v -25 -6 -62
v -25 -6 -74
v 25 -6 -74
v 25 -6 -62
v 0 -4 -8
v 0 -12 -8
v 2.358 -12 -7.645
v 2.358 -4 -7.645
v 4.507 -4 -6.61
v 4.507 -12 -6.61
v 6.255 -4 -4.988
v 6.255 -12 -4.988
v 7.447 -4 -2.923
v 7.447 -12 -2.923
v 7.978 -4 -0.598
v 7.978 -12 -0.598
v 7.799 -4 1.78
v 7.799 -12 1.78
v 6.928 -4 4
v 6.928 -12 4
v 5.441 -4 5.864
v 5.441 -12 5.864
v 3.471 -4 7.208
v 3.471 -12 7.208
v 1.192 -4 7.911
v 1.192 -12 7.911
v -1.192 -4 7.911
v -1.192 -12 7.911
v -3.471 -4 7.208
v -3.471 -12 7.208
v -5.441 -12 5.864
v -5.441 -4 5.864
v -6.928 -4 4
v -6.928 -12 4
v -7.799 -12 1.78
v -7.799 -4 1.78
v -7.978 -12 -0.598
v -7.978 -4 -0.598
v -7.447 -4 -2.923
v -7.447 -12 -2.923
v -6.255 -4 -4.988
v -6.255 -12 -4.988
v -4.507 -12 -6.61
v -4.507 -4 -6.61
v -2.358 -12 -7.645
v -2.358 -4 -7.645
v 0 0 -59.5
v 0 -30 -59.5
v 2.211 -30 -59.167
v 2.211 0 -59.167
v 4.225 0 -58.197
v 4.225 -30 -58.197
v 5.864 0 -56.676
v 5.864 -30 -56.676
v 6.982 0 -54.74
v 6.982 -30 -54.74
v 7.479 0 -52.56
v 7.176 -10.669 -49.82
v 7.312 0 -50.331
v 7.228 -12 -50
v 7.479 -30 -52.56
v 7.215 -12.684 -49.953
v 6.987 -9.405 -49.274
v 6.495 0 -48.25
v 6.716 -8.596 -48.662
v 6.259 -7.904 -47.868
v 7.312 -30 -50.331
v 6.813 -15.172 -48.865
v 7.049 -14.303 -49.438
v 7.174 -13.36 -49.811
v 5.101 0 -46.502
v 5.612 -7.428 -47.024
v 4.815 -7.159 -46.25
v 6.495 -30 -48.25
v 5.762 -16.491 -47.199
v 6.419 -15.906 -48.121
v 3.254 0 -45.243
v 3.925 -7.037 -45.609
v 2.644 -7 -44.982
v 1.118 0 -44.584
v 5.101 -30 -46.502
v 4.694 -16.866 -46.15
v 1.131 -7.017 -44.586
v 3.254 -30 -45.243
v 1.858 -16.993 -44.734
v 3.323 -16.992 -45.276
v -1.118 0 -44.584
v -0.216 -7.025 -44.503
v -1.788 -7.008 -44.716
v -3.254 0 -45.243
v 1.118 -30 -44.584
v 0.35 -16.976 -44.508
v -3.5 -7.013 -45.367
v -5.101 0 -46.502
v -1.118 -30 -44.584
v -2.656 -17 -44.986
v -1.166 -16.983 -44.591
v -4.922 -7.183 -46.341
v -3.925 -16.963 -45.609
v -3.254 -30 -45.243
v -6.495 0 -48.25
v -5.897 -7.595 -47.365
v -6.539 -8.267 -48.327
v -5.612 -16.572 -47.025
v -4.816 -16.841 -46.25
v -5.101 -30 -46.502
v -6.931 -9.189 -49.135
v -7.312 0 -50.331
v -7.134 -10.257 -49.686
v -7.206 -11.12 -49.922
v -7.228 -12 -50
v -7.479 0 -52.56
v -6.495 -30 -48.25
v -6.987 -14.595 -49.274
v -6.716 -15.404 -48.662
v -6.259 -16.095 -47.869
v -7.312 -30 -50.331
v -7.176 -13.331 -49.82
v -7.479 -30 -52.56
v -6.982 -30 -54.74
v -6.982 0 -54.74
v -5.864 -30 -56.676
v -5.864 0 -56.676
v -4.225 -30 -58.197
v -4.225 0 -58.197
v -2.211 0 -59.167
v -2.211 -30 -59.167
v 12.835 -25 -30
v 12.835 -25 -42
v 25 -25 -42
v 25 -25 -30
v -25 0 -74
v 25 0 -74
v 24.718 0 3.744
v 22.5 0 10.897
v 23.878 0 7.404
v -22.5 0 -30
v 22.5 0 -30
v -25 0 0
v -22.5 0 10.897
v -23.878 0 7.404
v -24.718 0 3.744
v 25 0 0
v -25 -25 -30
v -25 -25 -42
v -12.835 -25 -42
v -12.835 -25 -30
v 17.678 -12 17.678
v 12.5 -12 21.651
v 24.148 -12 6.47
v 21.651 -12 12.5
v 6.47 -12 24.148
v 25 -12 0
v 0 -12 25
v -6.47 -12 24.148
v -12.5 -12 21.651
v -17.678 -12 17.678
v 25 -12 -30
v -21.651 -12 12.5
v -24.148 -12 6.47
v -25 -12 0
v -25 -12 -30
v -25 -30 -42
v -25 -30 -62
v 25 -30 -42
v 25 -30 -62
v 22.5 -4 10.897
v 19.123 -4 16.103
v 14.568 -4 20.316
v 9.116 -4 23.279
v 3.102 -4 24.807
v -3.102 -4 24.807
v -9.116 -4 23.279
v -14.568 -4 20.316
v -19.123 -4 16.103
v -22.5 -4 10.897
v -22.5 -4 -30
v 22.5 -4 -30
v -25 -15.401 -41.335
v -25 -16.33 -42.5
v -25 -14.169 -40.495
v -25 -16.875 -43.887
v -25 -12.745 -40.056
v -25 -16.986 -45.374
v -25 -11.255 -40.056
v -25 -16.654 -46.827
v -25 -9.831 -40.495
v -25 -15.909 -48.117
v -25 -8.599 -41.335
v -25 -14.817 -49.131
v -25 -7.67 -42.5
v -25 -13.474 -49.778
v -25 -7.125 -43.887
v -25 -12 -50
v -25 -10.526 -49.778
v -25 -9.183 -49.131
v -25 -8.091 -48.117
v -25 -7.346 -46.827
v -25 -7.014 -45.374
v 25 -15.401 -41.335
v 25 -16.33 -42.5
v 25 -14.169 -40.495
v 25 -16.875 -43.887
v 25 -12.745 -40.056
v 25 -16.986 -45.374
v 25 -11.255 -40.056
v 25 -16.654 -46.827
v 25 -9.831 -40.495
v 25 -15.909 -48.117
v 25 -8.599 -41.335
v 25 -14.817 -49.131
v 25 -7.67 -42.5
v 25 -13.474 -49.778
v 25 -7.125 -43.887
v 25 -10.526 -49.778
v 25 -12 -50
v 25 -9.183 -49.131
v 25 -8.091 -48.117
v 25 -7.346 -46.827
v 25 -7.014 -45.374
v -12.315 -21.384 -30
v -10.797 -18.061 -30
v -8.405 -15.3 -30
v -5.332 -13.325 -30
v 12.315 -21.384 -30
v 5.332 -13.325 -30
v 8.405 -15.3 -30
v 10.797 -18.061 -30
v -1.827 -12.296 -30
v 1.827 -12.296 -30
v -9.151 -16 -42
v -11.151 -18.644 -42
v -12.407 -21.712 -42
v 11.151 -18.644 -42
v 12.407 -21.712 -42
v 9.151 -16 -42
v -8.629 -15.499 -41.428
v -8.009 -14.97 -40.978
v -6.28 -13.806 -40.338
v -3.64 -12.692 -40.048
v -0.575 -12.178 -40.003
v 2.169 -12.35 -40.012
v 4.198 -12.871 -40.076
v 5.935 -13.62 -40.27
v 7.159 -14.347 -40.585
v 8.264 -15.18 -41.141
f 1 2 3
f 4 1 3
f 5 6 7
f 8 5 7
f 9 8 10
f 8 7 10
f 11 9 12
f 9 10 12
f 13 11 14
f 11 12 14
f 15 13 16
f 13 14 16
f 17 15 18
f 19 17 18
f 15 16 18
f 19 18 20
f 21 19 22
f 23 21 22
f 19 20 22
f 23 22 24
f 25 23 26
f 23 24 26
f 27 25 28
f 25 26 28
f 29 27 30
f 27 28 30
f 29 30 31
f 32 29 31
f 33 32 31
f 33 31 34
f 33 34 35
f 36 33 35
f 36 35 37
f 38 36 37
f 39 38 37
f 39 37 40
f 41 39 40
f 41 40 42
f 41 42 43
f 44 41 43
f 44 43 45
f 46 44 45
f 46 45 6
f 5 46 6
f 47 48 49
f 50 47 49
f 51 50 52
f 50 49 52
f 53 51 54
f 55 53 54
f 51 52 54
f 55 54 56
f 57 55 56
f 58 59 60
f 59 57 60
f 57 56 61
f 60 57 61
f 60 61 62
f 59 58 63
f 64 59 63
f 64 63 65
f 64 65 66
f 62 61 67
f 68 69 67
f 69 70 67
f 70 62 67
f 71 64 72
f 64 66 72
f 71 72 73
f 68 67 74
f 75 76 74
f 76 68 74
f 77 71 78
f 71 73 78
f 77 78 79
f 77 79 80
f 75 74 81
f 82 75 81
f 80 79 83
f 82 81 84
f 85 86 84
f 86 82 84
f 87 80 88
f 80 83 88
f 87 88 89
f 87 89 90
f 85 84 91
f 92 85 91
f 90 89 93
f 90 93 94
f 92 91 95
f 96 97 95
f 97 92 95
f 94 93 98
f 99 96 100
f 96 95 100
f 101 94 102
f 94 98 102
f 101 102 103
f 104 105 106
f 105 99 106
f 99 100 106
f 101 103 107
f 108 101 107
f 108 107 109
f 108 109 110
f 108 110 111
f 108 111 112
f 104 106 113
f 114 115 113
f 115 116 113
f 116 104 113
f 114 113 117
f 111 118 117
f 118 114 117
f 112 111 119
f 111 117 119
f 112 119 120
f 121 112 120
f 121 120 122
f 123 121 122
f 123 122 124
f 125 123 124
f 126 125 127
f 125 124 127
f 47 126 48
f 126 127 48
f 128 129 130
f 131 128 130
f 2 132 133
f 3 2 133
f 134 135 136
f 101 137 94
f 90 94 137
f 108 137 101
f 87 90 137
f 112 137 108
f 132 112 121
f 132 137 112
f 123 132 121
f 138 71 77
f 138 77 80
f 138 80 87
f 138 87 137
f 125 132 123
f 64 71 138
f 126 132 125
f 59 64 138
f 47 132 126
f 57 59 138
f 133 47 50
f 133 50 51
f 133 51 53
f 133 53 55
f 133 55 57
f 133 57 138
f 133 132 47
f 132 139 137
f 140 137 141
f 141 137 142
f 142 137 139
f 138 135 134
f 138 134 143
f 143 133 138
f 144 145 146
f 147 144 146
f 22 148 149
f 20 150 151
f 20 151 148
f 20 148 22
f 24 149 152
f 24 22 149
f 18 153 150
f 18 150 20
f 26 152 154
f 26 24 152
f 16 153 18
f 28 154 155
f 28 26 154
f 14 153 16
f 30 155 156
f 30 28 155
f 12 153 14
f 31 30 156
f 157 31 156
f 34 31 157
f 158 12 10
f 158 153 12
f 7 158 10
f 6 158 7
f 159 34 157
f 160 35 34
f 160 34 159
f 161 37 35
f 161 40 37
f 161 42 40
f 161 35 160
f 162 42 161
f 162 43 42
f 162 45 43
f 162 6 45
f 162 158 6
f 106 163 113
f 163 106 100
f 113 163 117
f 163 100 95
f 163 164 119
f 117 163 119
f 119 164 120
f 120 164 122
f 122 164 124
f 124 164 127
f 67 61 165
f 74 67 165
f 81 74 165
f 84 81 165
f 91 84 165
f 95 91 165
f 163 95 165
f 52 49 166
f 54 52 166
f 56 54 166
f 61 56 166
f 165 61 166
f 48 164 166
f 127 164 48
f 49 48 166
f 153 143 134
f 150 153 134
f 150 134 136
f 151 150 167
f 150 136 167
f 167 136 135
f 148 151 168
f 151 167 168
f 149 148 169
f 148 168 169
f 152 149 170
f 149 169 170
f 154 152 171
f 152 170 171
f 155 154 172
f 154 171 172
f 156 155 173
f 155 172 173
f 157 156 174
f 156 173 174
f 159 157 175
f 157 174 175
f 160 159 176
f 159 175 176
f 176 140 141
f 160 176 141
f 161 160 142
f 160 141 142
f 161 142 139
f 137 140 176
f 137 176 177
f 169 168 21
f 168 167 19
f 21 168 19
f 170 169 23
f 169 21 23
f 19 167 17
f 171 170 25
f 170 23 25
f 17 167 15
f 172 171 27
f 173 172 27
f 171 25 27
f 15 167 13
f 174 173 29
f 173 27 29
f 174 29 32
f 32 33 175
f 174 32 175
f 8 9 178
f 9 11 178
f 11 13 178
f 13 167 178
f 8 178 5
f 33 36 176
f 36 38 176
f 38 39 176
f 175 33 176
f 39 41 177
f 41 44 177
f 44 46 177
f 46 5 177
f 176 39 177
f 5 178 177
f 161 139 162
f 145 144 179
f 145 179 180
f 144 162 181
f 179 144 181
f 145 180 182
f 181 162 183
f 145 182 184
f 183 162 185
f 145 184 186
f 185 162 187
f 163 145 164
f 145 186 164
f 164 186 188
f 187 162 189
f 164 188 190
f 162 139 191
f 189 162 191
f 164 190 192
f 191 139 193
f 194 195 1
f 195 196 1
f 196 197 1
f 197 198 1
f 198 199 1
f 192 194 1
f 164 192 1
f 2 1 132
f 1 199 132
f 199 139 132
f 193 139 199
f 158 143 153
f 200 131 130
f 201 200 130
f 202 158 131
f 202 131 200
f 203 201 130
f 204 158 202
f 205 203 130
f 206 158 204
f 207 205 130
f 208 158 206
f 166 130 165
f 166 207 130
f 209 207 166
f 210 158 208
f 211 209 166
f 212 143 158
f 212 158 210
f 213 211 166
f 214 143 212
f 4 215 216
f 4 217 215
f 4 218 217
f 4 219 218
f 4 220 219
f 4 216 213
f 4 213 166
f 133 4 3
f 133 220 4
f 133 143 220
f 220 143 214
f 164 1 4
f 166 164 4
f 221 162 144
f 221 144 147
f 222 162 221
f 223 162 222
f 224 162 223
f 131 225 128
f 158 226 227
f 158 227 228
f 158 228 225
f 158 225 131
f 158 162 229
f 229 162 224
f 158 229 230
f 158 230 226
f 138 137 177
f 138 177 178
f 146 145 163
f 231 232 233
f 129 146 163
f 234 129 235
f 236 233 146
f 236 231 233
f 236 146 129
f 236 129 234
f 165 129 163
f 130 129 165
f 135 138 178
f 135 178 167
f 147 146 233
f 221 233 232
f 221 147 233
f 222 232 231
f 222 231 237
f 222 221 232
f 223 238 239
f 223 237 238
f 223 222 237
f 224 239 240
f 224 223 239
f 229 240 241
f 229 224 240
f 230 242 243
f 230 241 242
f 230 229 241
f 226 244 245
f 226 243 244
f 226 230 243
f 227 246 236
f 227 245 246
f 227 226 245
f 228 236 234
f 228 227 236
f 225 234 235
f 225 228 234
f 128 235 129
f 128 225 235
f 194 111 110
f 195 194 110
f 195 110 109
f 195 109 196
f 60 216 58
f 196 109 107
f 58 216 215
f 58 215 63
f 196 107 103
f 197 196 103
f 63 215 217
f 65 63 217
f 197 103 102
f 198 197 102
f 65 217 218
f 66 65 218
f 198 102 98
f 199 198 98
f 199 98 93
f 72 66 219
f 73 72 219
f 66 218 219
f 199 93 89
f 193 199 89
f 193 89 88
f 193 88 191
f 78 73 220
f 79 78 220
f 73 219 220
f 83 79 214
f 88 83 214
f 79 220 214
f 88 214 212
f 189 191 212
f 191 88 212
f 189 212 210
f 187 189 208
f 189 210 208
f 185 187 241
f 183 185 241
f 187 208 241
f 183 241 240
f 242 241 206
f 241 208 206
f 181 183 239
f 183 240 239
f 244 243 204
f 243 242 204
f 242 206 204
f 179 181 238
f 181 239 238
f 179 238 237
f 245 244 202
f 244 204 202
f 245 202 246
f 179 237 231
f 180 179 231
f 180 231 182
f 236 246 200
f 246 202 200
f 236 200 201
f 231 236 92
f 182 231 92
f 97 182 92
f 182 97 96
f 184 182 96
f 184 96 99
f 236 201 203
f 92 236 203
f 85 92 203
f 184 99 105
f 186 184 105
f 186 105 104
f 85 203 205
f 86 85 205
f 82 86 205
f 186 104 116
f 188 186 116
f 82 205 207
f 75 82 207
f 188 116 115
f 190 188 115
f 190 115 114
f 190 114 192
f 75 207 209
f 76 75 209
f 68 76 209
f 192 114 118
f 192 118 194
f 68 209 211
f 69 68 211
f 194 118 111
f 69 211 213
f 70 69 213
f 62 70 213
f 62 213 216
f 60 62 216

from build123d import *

# Parameters (mm, degrees)
BOSS_EXTRU_1_DEPTH      = 12
ENL_V_MAT_EXTRU_1_DEPTH = 4
ESQUISSE3_R             = 8
ENL_V_MAT_EXTRU_2_DEPTH = 41.853396432
ESQUISSE4_W             = 50
ESQUISSE4_H             = 12
BOSS_EXTRU_2_DEPTH      = 25
ENL_V_MAT_EXTRU_3_DEPTH = 66.383484153
ESQUISSE7_W             = 50
ESQUISSE7_H             = 20
BOSS_EXTRU_3_DEPTH      = 30
ESQUISSE9_W             = 50
ESQUISSE9_H             = 12
BOSS_EXTRU_4_DEPTH      = 6
ESQUISSE10_R            = 5
ENL_V_MAT_EXTRU_4_DEPTH = 95.212525707
ESQUISSE11_R            = 7.5
ENL_V_MAT_EXTRU_5_DEPTH = 84.671978613


with BuildPart() as part:
    # Esquisse1 → Boss.-Extru.1 (new body)
    with BuildSketch(Plane(origin=(0, 0, 0), x_dir=(1, 0, 0), z_dir=(0, 1, 0))):
        with BuildLine():
            Line((-25, 0), (-25, 30))
            Line((-25, 30), (25, 30))
            Line((25, 30), (25, 0))
            ThreePointArc((25, 0), (0, -25), (-25, 0))
        make_face()
    extrude(amount=-BOSS_EXTRU_1_DEPTH)

    # Esquisse2 → Enlèv. mat.-Extru.1 (cut)
    with BuildSketch(Plane(origin=(0, 0, 0), x_dir=(1, 0, 0), z_dir=(0, 1, 0))):
        with BuildLine():
            Line((-22.5, 30), (22.5, 30))
            Line((22.5, 30), (22.5, -10.897247359))
            ThreePointArc((22.5, -10.897247359), (0, -25), (-22.5, -10.897247359))
            Line((-22.5, -10.897247359), (-22.5, 30))
        make_face()
    extrude(amount=-ENL_V_MAT_EXTRU_1_DEPTH, mode=Mode.SUBTRACT)

    # Esquisse3 → Enlèv. mat.-Extru.2 (cut, through all)
    with BuildSketch(Plane.XZ.offset(12)):
        with Locations(Location((0, 0, 0), (0, 0, 270))):
            Circle(ESQUISSE3_R)
    extrude(amount=-ENL_V_MAT_EXTRU_2_DEPTH, mode=Mode.SUBTRACT)

    # Esquisse4 → Boss.-Extru.2 (add)
    with BuildSketch(Plane(origin=(0, 0, 0), x_dir=(1, 0, 0), z_dir=(0, 1, 0))):
        with Locations((0, 36)):
            Rectangle(ESQUISSE4_W, ESQUISSE4_H)
    extrude(amount=-BOSS_EXTRU_2_DEPTH)

    # Esquisse5 → Enlèv. mat.-Extru.3 (cut, through all)
    with BuildSketch(Plane.XY.offset(-30)):
        with BuildLine():
            Line((12.834819399, -25), (-12.834819399, -25))
            ThreePointArc((-12.834819399, -25), (0, -12.165180601), (12.834819399, -25))
        make_face()
    extrude(amount=-ENL_V_MAT_EXTRU_3_DEPTH, mode=Mode.SUBTRACT)

    # Esquisse7 → Boss.-Extru.3 (add)
    with BuildSketch(Plane(origin=(0, 0, 0), x_dir=(1, 0, 0), z_dir=(0, 1, 0))):
        with Locations((0, 52)):
            Rectangle(ESQUISSE7_W, ESQUISSE7_H)
    extrude(amount=-BOSS_EXTRU_3_DEPTH)

    # Esquisse9 → Boss.-Extru.4 (add)
    with BuildSketch(Plane(origin=(0, 0, 0), x_dir=(1, 0, 0), z_dir=(0, 1, 0))):
        with Locations((0, 68)):
            Rectangle(ESQUISSE9_W, ESQUISSE9_H)
    extrude(amount=-BOSS_EXTRU_4_DEPTH)

    # Esquisse10 → Enlèv. mat.-Extru.4 (cut, through all)
    with BuildSketch(Plane(origin=(25, 0, 0), x_dir=(0, 0, -1), z_dir=(1, 0, 0))):
        with Locations((45, -12)):
            Circle(ESQUISSE10_R)
    extrude(amount=-ENL_V_MAT_EXTRU_4_DEPTH, mode=Mode.SUBTRACT)

    # Esquisse11 → Enlèv. mat.-Extru.5 (cut, through all)
    with BuildSketch(Plane.XZ.offset(30)):
        with Locations(Location((0, -52, 0), (0, 0, 270))):
            Circle(ESQUISSE11_R)
    extrude(amount=-ENL_V_MAT_EXTRU_5_DEPTH, mode=Mode.SUBTRACT)


solid = part.part
